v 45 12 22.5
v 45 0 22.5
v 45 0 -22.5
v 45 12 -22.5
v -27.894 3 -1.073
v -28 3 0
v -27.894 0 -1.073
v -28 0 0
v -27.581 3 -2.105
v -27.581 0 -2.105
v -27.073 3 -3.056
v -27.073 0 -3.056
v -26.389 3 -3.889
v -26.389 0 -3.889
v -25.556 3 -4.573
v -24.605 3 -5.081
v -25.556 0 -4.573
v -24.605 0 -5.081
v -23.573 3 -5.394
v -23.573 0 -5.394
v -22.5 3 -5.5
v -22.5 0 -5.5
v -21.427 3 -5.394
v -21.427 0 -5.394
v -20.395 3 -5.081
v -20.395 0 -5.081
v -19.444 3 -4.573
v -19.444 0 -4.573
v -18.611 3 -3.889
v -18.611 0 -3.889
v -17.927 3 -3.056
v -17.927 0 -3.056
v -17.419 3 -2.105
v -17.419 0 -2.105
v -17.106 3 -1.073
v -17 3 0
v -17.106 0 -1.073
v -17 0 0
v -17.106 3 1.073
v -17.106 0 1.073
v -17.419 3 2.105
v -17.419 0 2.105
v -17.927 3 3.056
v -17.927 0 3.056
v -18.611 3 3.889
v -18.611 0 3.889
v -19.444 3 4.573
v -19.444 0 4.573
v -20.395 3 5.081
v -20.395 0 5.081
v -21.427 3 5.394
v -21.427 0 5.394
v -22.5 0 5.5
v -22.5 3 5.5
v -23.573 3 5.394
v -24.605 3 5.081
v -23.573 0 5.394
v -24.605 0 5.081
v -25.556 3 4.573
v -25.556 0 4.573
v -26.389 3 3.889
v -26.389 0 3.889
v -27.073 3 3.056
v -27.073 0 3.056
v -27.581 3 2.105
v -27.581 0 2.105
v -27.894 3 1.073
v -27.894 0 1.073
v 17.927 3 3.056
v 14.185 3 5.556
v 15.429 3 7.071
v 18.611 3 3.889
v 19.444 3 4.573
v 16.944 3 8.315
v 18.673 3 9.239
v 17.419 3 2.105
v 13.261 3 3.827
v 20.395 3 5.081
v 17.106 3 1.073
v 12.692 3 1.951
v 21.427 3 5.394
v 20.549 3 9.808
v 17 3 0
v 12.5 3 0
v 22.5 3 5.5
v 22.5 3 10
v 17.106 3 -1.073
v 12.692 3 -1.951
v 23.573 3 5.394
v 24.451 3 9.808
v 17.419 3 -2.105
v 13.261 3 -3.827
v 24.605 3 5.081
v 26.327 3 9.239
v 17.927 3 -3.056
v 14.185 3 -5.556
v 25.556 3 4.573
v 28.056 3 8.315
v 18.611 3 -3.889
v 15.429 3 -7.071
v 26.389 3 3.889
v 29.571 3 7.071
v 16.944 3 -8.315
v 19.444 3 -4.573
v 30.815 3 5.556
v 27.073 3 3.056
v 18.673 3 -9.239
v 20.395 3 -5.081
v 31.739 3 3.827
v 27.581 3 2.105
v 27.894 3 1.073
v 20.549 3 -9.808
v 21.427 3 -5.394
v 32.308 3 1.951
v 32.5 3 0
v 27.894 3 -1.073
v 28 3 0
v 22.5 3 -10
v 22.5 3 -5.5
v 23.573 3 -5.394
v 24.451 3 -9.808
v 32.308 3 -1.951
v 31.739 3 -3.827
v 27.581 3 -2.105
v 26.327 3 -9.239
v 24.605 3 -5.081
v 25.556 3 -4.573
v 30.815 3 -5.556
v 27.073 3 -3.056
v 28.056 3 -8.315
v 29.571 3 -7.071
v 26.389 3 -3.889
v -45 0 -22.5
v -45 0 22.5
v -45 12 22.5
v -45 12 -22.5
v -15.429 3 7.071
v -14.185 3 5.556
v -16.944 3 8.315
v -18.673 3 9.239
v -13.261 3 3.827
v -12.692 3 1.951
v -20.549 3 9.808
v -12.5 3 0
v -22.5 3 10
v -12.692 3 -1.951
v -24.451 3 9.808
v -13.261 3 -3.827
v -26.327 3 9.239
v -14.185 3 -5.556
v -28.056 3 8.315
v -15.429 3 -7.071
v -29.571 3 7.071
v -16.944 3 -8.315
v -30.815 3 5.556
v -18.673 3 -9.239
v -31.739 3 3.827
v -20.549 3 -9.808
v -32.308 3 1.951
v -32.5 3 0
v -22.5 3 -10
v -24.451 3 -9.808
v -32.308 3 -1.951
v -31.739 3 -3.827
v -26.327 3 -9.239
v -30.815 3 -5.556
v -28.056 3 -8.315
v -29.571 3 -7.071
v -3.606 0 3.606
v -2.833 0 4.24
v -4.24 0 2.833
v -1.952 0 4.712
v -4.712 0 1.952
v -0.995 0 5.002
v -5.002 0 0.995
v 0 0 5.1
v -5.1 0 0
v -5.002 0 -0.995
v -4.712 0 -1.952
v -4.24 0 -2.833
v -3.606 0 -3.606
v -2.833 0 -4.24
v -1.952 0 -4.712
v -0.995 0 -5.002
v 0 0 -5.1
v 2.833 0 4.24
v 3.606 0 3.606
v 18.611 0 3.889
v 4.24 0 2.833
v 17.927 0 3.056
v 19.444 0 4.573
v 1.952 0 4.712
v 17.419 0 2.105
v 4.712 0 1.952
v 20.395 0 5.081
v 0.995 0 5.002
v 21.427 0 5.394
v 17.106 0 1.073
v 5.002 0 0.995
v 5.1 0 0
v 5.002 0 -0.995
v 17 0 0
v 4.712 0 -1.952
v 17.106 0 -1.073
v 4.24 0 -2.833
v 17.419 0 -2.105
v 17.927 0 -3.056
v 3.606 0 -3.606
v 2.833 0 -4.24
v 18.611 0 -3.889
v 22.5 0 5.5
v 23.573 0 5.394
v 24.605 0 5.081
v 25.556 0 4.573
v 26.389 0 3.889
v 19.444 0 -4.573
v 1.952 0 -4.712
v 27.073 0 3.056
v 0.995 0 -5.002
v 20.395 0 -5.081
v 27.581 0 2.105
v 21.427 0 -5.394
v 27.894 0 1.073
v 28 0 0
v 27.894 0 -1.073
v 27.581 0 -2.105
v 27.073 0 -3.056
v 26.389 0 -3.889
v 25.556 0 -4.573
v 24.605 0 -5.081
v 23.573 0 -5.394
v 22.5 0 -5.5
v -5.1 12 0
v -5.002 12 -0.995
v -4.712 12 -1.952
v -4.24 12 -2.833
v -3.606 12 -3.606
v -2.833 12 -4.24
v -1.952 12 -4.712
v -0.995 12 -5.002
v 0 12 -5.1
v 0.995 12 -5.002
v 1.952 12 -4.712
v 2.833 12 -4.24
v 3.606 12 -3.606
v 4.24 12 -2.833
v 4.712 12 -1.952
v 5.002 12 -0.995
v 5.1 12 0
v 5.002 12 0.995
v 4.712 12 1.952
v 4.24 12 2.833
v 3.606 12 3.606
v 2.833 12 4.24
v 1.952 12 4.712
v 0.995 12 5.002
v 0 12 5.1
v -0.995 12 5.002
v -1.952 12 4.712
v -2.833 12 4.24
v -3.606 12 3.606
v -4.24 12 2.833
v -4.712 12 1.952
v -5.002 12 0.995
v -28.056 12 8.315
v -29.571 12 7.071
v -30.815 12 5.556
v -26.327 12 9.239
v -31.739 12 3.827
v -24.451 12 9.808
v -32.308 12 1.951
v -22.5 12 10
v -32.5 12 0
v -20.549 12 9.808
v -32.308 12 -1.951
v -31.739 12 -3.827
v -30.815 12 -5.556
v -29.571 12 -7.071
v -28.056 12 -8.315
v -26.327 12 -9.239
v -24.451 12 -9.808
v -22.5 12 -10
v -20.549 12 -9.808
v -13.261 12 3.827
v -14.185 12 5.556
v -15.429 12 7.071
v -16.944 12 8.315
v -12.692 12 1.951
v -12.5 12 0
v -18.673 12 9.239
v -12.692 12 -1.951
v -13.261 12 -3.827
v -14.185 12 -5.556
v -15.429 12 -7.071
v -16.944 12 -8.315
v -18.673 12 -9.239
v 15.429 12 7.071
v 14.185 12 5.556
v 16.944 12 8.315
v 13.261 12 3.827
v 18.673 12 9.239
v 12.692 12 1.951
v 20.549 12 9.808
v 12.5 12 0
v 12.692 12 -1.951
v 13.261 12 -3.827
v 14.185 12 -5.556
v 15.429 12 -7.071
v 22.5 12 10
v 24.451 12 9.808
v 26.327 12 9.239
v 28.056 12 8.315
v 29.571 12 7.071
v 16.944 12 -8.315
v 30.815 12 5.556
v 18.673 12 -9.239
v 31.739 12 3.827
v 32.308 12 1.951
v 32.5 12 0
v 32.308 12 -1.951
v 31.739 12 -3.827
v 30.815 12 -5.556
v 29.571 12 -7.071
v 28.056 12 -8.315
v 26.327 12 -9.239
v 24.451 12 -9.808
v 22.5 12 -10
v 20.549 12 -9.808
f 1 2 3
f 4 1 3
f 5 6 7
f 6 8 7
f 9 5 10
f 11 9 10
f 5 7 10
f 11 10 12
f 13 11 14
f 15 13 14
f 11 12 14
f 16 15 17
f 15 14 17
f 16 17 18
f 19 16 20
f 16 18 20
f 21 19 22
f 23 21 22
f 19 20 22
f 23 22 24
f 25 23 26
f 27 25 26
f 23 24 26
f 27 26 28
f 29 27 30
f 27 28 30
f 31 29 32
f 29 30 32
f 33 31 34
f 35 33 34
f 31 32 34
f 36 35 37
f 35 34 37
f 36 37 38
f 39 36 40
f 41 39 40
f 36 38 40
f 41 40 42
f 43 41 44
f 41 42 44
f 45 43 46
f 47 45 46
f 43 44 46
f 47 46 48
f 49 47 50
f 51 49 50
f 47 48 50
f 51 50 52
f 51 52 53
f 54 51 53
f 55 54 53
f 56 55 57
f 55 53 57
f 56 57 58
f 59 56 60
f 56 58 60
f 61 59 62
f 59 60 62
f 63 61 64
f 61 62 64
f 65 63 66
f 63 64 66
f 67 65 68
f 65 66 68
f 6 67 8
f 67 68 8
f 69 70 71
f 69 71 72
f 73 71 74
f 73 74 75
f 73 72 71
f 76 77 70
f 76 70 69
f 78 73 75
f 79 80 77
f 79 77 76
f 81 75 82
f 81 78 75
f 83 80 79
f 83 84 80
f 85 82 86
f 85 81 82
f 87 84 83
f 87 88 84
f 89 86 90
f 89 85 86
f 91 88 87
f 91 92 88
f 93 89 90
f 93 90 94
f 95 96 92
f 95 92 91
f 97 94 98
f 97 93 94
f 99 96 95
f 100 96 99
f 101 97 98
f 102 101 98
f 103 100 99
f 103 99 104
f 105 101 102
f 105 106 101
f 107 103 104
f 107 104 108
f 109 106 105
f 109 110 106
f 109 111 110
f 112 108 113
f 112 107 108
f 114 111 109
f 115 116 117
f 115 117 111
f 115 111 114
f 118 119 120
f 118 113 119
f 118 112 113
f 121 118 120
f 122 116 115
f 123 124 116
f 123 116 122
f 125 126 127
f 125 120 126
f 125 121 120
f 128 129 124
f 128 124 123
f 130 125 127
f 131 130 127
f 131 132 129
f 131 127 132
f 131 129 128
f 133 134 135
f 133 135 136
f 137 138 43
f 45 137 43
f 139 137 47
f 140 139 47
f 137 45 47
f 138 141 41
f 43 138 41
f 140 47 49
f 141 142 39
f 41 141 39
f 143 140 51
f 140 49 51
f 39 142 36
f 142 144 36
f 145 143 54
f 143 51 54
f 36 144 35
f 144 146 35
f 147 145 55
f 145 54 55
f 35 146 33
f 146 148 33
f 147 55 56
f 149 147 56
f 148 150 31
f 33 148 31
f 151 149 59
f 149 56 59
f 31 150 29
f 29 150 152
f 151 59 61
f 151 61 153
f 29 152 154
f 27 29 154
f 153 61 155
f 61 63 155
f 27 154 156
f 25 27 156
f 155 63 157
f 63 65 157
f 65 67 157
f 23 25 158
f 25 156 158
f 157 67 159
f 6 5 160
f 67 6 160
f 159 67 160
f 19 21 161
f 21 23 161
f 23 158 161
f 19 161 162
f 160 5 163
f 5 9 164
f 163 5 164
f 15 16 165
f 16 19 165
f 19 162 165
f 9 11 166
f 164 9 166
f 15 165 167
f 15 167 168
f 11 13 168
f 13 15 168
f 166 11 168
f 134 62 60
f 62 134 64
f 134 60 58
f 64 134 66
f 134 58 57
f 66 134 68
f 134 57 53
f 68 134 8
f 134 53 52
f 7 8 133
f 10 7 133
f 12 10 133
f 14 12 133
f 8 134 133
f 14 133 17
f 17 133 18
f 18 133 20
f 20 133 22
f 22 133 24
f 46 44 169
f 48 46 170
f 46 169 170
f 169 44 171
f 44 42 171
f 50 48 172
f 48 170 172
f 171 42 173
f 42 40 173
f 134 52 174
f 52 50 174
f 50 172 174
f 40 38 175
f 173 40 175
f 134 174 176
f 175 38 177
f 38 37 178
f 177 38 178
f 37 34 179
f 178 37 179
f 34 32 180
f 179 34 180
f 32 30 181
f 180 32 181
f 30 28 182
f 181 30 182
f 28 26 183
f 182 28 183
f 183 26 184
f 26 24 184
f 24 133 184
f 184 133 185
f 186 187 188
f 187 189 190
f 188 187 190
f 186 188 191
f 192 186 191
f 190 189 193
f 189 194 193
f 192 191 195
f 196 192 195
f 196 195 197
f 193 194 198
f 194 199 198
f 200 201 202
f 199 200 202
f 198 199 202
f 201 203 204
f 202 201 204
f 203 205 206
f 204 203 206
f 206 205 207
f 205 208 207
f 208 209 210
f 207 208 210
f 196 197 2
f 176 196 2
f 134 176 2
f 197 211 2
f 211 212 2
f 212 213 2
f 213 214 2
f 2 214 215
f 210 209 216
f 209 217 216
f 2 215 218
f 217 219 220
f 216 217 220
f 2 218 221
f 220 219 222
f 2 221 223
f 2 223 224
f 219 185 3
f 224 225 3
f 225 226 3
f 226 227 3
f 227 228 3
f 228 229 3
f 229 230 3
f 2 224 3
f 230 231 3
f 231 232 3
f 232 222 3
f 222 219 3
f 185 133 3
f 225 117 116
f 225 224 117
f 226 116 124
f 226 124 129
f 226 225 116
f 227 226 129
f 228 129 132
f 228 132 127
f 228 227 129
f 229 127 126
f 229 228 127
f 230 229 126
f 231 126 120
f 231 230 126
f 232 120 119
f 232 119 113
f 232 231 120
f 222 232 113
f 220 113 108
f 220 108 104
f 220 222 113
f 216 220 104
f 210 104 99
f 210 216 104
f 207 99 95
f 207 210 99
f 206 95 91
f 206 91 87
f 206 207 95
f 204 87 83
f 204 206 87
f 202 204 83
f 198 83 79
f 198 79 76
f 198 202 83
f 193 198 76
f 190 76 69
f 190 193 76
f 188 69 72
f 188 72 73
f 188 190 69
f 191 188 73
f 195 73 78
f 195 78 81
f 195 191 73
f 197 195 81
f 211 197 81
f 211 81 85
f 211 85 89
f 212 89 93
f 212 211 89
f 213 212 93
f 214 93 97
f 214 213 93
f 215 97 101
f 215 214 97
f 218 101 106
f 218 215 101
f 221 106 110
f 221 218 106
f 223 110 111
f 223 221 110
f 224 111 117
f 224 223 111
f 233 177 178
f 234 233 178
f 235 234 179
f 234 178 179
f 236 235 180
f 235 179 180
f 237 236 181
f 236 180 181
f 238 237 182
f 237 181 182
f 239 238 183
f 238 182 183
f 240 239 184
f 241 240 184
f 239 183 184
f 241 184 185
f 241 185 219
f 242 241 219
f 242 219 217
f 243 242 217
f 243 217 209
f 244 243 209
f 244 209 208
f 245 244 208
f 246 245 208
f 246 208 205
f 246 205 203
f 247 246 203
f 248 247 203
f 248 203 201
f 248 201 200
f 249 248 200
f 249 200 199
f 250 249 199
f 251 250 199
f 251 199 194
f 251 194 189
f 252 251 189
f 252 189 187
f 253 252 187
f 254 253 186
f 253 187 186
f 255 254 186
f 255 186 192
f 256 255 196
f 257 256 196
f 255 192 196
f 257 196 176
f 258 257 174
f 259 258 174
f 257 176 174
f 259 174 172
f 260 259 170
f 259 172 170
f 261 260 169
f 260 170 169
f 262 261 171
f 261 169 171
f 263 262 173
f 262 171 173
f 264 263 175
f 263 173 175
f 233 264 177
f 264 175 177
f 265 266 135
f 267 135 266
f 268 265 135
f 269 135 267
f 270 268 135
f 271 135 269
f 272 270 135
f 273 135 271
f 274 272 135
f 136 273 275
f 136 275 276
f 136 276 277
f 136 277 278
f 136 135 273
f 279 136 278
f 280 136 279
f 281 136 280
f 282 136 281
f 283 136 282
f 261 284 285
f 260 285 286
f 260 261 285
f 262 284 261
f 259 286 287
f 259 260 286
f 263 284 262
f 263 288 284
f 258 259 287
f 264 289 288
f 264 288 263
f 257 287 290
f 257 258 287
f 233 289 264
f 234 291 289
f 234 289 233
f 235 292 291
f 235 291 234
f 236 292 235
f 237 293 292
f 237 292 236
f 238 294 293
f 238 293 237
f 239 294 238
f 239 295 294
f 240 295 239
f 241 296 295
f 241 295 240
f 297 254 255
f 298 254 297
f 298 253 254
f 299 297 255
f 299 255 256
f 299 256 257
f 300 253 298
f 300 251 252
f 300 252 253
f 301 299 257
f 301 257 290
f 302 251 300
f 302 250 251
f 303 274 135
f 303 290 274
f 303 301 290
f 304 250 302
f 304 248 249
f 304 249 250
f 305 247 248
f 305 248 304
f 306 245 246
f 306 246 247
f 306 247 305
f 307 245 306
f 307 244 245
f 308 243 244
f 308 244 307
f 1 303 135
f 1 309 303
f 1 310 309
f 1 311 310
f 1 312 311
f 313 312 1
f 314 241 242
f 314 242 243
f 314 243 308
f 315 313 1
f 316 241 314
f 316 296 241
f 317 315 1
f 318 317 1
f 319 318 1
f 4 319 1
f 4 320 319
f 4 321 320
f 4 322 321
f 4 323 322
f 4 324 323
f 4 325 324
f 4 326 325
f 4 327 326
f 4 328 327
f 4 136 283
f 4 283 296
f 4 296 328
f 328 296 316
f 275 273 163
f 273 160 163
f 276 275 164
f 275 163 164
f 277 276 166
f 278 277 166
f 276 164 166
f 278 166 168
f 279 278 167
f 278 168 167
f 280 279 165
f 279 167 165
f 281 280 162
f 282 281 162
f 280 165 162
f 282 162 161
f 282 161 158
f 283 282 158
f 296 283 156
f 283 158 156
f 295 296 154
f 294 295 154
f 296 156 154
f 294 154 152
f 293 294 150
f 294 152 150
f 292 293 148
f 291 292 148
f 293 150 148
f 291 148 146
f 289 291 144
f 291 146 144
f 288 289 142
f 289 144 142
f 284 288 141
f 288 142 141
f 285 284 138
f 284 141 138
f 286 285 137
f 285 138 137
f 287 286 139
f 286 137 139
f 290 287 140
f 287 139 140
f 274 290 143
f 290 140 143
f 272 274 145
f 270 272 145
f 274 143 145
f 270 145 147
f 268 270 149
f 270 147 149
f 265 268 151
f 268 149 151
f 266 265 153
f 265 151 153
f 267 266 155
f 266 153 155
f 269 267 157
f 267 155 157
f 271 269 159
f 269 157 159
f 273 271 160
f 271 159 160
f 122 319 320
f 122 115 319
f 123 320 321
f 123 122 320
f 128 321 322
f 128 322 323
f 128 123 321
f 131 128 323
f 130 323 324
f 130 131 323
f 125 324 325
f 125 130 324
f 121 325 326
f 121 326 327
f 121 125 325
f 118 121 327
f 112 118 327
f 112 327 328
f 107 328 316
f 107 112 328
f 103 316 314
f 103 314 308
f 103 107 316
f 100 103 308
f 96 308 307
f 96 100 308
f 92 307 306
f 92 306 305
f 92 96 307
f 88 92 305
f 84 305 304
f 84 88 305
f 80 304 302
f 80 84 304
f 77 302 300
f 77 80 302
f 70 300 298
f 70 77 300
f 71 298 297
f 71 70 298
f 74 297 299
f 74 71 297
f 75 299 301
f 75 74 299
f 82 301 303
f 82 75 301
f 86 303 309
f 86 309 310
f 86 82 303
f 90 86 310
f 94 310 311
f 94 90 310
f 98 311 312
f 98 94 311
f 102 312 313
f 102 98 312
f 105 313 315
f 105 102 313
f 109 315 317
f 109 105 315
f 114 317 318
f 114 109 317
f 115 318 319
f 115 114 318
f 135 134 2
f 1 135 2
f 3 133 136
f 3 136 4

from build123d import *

# Parameters (mm, degrees)
SKETCH_1_W             = 90
SKETCH_1_H             = 45
EXTRUDE_1_DEPTH        = 12
HOLE_WIZARD_M121_D     = 10.2
HOLE_WIZARD_M121_DEPTH = 12


with BuildPart() as part:
    # Эскиз1 → Бобышка-Вытянуть1 (new body)
    with BuildSketch(Plane(origin=(0, 0, 0), x_dir=(1, 0, 0), z_dir=(0, 1, 0))):
        Rectangle(SKETCH_1_W, SKETCH_1_H)
    extrude(amount=EXTRUDE_1_DEPTH)

    # Эскиз2 → Вырез-Повернуть1 (revolve, cut)
    with BuildSketch(Plane.XY):
        Polygon((-32.5, 12), (-32.5, 3), (-28, 3), (-28, 0), (-22.5, 0), (-22.5, 12), align=None)
    cut_revolve_1 = revolve(axis=Axis((-22.5, 12, 0), (0, -1, 0)), mode=Mode.SUBTRACT)

    # Зеркальное отражение1: Вырез-Повернуть1 across plane
    add(cut_revolve_1.mirror(Plane(origin=(0, 0, 0), x_dir=(0, 0, 1), z_dir=(1, 0, 0))), mode=Mode.SUBTRACT)

    # Отверстие обработанное метчиком M121
    with Locations(Plane(origin=(0, 12, 0), x_dir=(1, 0, 0), z_dir=(0, 1, 0))):
        with Locations((0, 0)):
            Hole(HOLE_WIZARD_M121_D / 2, depth=HOLE_WIZARD_M121_DEPTH)


solid = part.part
